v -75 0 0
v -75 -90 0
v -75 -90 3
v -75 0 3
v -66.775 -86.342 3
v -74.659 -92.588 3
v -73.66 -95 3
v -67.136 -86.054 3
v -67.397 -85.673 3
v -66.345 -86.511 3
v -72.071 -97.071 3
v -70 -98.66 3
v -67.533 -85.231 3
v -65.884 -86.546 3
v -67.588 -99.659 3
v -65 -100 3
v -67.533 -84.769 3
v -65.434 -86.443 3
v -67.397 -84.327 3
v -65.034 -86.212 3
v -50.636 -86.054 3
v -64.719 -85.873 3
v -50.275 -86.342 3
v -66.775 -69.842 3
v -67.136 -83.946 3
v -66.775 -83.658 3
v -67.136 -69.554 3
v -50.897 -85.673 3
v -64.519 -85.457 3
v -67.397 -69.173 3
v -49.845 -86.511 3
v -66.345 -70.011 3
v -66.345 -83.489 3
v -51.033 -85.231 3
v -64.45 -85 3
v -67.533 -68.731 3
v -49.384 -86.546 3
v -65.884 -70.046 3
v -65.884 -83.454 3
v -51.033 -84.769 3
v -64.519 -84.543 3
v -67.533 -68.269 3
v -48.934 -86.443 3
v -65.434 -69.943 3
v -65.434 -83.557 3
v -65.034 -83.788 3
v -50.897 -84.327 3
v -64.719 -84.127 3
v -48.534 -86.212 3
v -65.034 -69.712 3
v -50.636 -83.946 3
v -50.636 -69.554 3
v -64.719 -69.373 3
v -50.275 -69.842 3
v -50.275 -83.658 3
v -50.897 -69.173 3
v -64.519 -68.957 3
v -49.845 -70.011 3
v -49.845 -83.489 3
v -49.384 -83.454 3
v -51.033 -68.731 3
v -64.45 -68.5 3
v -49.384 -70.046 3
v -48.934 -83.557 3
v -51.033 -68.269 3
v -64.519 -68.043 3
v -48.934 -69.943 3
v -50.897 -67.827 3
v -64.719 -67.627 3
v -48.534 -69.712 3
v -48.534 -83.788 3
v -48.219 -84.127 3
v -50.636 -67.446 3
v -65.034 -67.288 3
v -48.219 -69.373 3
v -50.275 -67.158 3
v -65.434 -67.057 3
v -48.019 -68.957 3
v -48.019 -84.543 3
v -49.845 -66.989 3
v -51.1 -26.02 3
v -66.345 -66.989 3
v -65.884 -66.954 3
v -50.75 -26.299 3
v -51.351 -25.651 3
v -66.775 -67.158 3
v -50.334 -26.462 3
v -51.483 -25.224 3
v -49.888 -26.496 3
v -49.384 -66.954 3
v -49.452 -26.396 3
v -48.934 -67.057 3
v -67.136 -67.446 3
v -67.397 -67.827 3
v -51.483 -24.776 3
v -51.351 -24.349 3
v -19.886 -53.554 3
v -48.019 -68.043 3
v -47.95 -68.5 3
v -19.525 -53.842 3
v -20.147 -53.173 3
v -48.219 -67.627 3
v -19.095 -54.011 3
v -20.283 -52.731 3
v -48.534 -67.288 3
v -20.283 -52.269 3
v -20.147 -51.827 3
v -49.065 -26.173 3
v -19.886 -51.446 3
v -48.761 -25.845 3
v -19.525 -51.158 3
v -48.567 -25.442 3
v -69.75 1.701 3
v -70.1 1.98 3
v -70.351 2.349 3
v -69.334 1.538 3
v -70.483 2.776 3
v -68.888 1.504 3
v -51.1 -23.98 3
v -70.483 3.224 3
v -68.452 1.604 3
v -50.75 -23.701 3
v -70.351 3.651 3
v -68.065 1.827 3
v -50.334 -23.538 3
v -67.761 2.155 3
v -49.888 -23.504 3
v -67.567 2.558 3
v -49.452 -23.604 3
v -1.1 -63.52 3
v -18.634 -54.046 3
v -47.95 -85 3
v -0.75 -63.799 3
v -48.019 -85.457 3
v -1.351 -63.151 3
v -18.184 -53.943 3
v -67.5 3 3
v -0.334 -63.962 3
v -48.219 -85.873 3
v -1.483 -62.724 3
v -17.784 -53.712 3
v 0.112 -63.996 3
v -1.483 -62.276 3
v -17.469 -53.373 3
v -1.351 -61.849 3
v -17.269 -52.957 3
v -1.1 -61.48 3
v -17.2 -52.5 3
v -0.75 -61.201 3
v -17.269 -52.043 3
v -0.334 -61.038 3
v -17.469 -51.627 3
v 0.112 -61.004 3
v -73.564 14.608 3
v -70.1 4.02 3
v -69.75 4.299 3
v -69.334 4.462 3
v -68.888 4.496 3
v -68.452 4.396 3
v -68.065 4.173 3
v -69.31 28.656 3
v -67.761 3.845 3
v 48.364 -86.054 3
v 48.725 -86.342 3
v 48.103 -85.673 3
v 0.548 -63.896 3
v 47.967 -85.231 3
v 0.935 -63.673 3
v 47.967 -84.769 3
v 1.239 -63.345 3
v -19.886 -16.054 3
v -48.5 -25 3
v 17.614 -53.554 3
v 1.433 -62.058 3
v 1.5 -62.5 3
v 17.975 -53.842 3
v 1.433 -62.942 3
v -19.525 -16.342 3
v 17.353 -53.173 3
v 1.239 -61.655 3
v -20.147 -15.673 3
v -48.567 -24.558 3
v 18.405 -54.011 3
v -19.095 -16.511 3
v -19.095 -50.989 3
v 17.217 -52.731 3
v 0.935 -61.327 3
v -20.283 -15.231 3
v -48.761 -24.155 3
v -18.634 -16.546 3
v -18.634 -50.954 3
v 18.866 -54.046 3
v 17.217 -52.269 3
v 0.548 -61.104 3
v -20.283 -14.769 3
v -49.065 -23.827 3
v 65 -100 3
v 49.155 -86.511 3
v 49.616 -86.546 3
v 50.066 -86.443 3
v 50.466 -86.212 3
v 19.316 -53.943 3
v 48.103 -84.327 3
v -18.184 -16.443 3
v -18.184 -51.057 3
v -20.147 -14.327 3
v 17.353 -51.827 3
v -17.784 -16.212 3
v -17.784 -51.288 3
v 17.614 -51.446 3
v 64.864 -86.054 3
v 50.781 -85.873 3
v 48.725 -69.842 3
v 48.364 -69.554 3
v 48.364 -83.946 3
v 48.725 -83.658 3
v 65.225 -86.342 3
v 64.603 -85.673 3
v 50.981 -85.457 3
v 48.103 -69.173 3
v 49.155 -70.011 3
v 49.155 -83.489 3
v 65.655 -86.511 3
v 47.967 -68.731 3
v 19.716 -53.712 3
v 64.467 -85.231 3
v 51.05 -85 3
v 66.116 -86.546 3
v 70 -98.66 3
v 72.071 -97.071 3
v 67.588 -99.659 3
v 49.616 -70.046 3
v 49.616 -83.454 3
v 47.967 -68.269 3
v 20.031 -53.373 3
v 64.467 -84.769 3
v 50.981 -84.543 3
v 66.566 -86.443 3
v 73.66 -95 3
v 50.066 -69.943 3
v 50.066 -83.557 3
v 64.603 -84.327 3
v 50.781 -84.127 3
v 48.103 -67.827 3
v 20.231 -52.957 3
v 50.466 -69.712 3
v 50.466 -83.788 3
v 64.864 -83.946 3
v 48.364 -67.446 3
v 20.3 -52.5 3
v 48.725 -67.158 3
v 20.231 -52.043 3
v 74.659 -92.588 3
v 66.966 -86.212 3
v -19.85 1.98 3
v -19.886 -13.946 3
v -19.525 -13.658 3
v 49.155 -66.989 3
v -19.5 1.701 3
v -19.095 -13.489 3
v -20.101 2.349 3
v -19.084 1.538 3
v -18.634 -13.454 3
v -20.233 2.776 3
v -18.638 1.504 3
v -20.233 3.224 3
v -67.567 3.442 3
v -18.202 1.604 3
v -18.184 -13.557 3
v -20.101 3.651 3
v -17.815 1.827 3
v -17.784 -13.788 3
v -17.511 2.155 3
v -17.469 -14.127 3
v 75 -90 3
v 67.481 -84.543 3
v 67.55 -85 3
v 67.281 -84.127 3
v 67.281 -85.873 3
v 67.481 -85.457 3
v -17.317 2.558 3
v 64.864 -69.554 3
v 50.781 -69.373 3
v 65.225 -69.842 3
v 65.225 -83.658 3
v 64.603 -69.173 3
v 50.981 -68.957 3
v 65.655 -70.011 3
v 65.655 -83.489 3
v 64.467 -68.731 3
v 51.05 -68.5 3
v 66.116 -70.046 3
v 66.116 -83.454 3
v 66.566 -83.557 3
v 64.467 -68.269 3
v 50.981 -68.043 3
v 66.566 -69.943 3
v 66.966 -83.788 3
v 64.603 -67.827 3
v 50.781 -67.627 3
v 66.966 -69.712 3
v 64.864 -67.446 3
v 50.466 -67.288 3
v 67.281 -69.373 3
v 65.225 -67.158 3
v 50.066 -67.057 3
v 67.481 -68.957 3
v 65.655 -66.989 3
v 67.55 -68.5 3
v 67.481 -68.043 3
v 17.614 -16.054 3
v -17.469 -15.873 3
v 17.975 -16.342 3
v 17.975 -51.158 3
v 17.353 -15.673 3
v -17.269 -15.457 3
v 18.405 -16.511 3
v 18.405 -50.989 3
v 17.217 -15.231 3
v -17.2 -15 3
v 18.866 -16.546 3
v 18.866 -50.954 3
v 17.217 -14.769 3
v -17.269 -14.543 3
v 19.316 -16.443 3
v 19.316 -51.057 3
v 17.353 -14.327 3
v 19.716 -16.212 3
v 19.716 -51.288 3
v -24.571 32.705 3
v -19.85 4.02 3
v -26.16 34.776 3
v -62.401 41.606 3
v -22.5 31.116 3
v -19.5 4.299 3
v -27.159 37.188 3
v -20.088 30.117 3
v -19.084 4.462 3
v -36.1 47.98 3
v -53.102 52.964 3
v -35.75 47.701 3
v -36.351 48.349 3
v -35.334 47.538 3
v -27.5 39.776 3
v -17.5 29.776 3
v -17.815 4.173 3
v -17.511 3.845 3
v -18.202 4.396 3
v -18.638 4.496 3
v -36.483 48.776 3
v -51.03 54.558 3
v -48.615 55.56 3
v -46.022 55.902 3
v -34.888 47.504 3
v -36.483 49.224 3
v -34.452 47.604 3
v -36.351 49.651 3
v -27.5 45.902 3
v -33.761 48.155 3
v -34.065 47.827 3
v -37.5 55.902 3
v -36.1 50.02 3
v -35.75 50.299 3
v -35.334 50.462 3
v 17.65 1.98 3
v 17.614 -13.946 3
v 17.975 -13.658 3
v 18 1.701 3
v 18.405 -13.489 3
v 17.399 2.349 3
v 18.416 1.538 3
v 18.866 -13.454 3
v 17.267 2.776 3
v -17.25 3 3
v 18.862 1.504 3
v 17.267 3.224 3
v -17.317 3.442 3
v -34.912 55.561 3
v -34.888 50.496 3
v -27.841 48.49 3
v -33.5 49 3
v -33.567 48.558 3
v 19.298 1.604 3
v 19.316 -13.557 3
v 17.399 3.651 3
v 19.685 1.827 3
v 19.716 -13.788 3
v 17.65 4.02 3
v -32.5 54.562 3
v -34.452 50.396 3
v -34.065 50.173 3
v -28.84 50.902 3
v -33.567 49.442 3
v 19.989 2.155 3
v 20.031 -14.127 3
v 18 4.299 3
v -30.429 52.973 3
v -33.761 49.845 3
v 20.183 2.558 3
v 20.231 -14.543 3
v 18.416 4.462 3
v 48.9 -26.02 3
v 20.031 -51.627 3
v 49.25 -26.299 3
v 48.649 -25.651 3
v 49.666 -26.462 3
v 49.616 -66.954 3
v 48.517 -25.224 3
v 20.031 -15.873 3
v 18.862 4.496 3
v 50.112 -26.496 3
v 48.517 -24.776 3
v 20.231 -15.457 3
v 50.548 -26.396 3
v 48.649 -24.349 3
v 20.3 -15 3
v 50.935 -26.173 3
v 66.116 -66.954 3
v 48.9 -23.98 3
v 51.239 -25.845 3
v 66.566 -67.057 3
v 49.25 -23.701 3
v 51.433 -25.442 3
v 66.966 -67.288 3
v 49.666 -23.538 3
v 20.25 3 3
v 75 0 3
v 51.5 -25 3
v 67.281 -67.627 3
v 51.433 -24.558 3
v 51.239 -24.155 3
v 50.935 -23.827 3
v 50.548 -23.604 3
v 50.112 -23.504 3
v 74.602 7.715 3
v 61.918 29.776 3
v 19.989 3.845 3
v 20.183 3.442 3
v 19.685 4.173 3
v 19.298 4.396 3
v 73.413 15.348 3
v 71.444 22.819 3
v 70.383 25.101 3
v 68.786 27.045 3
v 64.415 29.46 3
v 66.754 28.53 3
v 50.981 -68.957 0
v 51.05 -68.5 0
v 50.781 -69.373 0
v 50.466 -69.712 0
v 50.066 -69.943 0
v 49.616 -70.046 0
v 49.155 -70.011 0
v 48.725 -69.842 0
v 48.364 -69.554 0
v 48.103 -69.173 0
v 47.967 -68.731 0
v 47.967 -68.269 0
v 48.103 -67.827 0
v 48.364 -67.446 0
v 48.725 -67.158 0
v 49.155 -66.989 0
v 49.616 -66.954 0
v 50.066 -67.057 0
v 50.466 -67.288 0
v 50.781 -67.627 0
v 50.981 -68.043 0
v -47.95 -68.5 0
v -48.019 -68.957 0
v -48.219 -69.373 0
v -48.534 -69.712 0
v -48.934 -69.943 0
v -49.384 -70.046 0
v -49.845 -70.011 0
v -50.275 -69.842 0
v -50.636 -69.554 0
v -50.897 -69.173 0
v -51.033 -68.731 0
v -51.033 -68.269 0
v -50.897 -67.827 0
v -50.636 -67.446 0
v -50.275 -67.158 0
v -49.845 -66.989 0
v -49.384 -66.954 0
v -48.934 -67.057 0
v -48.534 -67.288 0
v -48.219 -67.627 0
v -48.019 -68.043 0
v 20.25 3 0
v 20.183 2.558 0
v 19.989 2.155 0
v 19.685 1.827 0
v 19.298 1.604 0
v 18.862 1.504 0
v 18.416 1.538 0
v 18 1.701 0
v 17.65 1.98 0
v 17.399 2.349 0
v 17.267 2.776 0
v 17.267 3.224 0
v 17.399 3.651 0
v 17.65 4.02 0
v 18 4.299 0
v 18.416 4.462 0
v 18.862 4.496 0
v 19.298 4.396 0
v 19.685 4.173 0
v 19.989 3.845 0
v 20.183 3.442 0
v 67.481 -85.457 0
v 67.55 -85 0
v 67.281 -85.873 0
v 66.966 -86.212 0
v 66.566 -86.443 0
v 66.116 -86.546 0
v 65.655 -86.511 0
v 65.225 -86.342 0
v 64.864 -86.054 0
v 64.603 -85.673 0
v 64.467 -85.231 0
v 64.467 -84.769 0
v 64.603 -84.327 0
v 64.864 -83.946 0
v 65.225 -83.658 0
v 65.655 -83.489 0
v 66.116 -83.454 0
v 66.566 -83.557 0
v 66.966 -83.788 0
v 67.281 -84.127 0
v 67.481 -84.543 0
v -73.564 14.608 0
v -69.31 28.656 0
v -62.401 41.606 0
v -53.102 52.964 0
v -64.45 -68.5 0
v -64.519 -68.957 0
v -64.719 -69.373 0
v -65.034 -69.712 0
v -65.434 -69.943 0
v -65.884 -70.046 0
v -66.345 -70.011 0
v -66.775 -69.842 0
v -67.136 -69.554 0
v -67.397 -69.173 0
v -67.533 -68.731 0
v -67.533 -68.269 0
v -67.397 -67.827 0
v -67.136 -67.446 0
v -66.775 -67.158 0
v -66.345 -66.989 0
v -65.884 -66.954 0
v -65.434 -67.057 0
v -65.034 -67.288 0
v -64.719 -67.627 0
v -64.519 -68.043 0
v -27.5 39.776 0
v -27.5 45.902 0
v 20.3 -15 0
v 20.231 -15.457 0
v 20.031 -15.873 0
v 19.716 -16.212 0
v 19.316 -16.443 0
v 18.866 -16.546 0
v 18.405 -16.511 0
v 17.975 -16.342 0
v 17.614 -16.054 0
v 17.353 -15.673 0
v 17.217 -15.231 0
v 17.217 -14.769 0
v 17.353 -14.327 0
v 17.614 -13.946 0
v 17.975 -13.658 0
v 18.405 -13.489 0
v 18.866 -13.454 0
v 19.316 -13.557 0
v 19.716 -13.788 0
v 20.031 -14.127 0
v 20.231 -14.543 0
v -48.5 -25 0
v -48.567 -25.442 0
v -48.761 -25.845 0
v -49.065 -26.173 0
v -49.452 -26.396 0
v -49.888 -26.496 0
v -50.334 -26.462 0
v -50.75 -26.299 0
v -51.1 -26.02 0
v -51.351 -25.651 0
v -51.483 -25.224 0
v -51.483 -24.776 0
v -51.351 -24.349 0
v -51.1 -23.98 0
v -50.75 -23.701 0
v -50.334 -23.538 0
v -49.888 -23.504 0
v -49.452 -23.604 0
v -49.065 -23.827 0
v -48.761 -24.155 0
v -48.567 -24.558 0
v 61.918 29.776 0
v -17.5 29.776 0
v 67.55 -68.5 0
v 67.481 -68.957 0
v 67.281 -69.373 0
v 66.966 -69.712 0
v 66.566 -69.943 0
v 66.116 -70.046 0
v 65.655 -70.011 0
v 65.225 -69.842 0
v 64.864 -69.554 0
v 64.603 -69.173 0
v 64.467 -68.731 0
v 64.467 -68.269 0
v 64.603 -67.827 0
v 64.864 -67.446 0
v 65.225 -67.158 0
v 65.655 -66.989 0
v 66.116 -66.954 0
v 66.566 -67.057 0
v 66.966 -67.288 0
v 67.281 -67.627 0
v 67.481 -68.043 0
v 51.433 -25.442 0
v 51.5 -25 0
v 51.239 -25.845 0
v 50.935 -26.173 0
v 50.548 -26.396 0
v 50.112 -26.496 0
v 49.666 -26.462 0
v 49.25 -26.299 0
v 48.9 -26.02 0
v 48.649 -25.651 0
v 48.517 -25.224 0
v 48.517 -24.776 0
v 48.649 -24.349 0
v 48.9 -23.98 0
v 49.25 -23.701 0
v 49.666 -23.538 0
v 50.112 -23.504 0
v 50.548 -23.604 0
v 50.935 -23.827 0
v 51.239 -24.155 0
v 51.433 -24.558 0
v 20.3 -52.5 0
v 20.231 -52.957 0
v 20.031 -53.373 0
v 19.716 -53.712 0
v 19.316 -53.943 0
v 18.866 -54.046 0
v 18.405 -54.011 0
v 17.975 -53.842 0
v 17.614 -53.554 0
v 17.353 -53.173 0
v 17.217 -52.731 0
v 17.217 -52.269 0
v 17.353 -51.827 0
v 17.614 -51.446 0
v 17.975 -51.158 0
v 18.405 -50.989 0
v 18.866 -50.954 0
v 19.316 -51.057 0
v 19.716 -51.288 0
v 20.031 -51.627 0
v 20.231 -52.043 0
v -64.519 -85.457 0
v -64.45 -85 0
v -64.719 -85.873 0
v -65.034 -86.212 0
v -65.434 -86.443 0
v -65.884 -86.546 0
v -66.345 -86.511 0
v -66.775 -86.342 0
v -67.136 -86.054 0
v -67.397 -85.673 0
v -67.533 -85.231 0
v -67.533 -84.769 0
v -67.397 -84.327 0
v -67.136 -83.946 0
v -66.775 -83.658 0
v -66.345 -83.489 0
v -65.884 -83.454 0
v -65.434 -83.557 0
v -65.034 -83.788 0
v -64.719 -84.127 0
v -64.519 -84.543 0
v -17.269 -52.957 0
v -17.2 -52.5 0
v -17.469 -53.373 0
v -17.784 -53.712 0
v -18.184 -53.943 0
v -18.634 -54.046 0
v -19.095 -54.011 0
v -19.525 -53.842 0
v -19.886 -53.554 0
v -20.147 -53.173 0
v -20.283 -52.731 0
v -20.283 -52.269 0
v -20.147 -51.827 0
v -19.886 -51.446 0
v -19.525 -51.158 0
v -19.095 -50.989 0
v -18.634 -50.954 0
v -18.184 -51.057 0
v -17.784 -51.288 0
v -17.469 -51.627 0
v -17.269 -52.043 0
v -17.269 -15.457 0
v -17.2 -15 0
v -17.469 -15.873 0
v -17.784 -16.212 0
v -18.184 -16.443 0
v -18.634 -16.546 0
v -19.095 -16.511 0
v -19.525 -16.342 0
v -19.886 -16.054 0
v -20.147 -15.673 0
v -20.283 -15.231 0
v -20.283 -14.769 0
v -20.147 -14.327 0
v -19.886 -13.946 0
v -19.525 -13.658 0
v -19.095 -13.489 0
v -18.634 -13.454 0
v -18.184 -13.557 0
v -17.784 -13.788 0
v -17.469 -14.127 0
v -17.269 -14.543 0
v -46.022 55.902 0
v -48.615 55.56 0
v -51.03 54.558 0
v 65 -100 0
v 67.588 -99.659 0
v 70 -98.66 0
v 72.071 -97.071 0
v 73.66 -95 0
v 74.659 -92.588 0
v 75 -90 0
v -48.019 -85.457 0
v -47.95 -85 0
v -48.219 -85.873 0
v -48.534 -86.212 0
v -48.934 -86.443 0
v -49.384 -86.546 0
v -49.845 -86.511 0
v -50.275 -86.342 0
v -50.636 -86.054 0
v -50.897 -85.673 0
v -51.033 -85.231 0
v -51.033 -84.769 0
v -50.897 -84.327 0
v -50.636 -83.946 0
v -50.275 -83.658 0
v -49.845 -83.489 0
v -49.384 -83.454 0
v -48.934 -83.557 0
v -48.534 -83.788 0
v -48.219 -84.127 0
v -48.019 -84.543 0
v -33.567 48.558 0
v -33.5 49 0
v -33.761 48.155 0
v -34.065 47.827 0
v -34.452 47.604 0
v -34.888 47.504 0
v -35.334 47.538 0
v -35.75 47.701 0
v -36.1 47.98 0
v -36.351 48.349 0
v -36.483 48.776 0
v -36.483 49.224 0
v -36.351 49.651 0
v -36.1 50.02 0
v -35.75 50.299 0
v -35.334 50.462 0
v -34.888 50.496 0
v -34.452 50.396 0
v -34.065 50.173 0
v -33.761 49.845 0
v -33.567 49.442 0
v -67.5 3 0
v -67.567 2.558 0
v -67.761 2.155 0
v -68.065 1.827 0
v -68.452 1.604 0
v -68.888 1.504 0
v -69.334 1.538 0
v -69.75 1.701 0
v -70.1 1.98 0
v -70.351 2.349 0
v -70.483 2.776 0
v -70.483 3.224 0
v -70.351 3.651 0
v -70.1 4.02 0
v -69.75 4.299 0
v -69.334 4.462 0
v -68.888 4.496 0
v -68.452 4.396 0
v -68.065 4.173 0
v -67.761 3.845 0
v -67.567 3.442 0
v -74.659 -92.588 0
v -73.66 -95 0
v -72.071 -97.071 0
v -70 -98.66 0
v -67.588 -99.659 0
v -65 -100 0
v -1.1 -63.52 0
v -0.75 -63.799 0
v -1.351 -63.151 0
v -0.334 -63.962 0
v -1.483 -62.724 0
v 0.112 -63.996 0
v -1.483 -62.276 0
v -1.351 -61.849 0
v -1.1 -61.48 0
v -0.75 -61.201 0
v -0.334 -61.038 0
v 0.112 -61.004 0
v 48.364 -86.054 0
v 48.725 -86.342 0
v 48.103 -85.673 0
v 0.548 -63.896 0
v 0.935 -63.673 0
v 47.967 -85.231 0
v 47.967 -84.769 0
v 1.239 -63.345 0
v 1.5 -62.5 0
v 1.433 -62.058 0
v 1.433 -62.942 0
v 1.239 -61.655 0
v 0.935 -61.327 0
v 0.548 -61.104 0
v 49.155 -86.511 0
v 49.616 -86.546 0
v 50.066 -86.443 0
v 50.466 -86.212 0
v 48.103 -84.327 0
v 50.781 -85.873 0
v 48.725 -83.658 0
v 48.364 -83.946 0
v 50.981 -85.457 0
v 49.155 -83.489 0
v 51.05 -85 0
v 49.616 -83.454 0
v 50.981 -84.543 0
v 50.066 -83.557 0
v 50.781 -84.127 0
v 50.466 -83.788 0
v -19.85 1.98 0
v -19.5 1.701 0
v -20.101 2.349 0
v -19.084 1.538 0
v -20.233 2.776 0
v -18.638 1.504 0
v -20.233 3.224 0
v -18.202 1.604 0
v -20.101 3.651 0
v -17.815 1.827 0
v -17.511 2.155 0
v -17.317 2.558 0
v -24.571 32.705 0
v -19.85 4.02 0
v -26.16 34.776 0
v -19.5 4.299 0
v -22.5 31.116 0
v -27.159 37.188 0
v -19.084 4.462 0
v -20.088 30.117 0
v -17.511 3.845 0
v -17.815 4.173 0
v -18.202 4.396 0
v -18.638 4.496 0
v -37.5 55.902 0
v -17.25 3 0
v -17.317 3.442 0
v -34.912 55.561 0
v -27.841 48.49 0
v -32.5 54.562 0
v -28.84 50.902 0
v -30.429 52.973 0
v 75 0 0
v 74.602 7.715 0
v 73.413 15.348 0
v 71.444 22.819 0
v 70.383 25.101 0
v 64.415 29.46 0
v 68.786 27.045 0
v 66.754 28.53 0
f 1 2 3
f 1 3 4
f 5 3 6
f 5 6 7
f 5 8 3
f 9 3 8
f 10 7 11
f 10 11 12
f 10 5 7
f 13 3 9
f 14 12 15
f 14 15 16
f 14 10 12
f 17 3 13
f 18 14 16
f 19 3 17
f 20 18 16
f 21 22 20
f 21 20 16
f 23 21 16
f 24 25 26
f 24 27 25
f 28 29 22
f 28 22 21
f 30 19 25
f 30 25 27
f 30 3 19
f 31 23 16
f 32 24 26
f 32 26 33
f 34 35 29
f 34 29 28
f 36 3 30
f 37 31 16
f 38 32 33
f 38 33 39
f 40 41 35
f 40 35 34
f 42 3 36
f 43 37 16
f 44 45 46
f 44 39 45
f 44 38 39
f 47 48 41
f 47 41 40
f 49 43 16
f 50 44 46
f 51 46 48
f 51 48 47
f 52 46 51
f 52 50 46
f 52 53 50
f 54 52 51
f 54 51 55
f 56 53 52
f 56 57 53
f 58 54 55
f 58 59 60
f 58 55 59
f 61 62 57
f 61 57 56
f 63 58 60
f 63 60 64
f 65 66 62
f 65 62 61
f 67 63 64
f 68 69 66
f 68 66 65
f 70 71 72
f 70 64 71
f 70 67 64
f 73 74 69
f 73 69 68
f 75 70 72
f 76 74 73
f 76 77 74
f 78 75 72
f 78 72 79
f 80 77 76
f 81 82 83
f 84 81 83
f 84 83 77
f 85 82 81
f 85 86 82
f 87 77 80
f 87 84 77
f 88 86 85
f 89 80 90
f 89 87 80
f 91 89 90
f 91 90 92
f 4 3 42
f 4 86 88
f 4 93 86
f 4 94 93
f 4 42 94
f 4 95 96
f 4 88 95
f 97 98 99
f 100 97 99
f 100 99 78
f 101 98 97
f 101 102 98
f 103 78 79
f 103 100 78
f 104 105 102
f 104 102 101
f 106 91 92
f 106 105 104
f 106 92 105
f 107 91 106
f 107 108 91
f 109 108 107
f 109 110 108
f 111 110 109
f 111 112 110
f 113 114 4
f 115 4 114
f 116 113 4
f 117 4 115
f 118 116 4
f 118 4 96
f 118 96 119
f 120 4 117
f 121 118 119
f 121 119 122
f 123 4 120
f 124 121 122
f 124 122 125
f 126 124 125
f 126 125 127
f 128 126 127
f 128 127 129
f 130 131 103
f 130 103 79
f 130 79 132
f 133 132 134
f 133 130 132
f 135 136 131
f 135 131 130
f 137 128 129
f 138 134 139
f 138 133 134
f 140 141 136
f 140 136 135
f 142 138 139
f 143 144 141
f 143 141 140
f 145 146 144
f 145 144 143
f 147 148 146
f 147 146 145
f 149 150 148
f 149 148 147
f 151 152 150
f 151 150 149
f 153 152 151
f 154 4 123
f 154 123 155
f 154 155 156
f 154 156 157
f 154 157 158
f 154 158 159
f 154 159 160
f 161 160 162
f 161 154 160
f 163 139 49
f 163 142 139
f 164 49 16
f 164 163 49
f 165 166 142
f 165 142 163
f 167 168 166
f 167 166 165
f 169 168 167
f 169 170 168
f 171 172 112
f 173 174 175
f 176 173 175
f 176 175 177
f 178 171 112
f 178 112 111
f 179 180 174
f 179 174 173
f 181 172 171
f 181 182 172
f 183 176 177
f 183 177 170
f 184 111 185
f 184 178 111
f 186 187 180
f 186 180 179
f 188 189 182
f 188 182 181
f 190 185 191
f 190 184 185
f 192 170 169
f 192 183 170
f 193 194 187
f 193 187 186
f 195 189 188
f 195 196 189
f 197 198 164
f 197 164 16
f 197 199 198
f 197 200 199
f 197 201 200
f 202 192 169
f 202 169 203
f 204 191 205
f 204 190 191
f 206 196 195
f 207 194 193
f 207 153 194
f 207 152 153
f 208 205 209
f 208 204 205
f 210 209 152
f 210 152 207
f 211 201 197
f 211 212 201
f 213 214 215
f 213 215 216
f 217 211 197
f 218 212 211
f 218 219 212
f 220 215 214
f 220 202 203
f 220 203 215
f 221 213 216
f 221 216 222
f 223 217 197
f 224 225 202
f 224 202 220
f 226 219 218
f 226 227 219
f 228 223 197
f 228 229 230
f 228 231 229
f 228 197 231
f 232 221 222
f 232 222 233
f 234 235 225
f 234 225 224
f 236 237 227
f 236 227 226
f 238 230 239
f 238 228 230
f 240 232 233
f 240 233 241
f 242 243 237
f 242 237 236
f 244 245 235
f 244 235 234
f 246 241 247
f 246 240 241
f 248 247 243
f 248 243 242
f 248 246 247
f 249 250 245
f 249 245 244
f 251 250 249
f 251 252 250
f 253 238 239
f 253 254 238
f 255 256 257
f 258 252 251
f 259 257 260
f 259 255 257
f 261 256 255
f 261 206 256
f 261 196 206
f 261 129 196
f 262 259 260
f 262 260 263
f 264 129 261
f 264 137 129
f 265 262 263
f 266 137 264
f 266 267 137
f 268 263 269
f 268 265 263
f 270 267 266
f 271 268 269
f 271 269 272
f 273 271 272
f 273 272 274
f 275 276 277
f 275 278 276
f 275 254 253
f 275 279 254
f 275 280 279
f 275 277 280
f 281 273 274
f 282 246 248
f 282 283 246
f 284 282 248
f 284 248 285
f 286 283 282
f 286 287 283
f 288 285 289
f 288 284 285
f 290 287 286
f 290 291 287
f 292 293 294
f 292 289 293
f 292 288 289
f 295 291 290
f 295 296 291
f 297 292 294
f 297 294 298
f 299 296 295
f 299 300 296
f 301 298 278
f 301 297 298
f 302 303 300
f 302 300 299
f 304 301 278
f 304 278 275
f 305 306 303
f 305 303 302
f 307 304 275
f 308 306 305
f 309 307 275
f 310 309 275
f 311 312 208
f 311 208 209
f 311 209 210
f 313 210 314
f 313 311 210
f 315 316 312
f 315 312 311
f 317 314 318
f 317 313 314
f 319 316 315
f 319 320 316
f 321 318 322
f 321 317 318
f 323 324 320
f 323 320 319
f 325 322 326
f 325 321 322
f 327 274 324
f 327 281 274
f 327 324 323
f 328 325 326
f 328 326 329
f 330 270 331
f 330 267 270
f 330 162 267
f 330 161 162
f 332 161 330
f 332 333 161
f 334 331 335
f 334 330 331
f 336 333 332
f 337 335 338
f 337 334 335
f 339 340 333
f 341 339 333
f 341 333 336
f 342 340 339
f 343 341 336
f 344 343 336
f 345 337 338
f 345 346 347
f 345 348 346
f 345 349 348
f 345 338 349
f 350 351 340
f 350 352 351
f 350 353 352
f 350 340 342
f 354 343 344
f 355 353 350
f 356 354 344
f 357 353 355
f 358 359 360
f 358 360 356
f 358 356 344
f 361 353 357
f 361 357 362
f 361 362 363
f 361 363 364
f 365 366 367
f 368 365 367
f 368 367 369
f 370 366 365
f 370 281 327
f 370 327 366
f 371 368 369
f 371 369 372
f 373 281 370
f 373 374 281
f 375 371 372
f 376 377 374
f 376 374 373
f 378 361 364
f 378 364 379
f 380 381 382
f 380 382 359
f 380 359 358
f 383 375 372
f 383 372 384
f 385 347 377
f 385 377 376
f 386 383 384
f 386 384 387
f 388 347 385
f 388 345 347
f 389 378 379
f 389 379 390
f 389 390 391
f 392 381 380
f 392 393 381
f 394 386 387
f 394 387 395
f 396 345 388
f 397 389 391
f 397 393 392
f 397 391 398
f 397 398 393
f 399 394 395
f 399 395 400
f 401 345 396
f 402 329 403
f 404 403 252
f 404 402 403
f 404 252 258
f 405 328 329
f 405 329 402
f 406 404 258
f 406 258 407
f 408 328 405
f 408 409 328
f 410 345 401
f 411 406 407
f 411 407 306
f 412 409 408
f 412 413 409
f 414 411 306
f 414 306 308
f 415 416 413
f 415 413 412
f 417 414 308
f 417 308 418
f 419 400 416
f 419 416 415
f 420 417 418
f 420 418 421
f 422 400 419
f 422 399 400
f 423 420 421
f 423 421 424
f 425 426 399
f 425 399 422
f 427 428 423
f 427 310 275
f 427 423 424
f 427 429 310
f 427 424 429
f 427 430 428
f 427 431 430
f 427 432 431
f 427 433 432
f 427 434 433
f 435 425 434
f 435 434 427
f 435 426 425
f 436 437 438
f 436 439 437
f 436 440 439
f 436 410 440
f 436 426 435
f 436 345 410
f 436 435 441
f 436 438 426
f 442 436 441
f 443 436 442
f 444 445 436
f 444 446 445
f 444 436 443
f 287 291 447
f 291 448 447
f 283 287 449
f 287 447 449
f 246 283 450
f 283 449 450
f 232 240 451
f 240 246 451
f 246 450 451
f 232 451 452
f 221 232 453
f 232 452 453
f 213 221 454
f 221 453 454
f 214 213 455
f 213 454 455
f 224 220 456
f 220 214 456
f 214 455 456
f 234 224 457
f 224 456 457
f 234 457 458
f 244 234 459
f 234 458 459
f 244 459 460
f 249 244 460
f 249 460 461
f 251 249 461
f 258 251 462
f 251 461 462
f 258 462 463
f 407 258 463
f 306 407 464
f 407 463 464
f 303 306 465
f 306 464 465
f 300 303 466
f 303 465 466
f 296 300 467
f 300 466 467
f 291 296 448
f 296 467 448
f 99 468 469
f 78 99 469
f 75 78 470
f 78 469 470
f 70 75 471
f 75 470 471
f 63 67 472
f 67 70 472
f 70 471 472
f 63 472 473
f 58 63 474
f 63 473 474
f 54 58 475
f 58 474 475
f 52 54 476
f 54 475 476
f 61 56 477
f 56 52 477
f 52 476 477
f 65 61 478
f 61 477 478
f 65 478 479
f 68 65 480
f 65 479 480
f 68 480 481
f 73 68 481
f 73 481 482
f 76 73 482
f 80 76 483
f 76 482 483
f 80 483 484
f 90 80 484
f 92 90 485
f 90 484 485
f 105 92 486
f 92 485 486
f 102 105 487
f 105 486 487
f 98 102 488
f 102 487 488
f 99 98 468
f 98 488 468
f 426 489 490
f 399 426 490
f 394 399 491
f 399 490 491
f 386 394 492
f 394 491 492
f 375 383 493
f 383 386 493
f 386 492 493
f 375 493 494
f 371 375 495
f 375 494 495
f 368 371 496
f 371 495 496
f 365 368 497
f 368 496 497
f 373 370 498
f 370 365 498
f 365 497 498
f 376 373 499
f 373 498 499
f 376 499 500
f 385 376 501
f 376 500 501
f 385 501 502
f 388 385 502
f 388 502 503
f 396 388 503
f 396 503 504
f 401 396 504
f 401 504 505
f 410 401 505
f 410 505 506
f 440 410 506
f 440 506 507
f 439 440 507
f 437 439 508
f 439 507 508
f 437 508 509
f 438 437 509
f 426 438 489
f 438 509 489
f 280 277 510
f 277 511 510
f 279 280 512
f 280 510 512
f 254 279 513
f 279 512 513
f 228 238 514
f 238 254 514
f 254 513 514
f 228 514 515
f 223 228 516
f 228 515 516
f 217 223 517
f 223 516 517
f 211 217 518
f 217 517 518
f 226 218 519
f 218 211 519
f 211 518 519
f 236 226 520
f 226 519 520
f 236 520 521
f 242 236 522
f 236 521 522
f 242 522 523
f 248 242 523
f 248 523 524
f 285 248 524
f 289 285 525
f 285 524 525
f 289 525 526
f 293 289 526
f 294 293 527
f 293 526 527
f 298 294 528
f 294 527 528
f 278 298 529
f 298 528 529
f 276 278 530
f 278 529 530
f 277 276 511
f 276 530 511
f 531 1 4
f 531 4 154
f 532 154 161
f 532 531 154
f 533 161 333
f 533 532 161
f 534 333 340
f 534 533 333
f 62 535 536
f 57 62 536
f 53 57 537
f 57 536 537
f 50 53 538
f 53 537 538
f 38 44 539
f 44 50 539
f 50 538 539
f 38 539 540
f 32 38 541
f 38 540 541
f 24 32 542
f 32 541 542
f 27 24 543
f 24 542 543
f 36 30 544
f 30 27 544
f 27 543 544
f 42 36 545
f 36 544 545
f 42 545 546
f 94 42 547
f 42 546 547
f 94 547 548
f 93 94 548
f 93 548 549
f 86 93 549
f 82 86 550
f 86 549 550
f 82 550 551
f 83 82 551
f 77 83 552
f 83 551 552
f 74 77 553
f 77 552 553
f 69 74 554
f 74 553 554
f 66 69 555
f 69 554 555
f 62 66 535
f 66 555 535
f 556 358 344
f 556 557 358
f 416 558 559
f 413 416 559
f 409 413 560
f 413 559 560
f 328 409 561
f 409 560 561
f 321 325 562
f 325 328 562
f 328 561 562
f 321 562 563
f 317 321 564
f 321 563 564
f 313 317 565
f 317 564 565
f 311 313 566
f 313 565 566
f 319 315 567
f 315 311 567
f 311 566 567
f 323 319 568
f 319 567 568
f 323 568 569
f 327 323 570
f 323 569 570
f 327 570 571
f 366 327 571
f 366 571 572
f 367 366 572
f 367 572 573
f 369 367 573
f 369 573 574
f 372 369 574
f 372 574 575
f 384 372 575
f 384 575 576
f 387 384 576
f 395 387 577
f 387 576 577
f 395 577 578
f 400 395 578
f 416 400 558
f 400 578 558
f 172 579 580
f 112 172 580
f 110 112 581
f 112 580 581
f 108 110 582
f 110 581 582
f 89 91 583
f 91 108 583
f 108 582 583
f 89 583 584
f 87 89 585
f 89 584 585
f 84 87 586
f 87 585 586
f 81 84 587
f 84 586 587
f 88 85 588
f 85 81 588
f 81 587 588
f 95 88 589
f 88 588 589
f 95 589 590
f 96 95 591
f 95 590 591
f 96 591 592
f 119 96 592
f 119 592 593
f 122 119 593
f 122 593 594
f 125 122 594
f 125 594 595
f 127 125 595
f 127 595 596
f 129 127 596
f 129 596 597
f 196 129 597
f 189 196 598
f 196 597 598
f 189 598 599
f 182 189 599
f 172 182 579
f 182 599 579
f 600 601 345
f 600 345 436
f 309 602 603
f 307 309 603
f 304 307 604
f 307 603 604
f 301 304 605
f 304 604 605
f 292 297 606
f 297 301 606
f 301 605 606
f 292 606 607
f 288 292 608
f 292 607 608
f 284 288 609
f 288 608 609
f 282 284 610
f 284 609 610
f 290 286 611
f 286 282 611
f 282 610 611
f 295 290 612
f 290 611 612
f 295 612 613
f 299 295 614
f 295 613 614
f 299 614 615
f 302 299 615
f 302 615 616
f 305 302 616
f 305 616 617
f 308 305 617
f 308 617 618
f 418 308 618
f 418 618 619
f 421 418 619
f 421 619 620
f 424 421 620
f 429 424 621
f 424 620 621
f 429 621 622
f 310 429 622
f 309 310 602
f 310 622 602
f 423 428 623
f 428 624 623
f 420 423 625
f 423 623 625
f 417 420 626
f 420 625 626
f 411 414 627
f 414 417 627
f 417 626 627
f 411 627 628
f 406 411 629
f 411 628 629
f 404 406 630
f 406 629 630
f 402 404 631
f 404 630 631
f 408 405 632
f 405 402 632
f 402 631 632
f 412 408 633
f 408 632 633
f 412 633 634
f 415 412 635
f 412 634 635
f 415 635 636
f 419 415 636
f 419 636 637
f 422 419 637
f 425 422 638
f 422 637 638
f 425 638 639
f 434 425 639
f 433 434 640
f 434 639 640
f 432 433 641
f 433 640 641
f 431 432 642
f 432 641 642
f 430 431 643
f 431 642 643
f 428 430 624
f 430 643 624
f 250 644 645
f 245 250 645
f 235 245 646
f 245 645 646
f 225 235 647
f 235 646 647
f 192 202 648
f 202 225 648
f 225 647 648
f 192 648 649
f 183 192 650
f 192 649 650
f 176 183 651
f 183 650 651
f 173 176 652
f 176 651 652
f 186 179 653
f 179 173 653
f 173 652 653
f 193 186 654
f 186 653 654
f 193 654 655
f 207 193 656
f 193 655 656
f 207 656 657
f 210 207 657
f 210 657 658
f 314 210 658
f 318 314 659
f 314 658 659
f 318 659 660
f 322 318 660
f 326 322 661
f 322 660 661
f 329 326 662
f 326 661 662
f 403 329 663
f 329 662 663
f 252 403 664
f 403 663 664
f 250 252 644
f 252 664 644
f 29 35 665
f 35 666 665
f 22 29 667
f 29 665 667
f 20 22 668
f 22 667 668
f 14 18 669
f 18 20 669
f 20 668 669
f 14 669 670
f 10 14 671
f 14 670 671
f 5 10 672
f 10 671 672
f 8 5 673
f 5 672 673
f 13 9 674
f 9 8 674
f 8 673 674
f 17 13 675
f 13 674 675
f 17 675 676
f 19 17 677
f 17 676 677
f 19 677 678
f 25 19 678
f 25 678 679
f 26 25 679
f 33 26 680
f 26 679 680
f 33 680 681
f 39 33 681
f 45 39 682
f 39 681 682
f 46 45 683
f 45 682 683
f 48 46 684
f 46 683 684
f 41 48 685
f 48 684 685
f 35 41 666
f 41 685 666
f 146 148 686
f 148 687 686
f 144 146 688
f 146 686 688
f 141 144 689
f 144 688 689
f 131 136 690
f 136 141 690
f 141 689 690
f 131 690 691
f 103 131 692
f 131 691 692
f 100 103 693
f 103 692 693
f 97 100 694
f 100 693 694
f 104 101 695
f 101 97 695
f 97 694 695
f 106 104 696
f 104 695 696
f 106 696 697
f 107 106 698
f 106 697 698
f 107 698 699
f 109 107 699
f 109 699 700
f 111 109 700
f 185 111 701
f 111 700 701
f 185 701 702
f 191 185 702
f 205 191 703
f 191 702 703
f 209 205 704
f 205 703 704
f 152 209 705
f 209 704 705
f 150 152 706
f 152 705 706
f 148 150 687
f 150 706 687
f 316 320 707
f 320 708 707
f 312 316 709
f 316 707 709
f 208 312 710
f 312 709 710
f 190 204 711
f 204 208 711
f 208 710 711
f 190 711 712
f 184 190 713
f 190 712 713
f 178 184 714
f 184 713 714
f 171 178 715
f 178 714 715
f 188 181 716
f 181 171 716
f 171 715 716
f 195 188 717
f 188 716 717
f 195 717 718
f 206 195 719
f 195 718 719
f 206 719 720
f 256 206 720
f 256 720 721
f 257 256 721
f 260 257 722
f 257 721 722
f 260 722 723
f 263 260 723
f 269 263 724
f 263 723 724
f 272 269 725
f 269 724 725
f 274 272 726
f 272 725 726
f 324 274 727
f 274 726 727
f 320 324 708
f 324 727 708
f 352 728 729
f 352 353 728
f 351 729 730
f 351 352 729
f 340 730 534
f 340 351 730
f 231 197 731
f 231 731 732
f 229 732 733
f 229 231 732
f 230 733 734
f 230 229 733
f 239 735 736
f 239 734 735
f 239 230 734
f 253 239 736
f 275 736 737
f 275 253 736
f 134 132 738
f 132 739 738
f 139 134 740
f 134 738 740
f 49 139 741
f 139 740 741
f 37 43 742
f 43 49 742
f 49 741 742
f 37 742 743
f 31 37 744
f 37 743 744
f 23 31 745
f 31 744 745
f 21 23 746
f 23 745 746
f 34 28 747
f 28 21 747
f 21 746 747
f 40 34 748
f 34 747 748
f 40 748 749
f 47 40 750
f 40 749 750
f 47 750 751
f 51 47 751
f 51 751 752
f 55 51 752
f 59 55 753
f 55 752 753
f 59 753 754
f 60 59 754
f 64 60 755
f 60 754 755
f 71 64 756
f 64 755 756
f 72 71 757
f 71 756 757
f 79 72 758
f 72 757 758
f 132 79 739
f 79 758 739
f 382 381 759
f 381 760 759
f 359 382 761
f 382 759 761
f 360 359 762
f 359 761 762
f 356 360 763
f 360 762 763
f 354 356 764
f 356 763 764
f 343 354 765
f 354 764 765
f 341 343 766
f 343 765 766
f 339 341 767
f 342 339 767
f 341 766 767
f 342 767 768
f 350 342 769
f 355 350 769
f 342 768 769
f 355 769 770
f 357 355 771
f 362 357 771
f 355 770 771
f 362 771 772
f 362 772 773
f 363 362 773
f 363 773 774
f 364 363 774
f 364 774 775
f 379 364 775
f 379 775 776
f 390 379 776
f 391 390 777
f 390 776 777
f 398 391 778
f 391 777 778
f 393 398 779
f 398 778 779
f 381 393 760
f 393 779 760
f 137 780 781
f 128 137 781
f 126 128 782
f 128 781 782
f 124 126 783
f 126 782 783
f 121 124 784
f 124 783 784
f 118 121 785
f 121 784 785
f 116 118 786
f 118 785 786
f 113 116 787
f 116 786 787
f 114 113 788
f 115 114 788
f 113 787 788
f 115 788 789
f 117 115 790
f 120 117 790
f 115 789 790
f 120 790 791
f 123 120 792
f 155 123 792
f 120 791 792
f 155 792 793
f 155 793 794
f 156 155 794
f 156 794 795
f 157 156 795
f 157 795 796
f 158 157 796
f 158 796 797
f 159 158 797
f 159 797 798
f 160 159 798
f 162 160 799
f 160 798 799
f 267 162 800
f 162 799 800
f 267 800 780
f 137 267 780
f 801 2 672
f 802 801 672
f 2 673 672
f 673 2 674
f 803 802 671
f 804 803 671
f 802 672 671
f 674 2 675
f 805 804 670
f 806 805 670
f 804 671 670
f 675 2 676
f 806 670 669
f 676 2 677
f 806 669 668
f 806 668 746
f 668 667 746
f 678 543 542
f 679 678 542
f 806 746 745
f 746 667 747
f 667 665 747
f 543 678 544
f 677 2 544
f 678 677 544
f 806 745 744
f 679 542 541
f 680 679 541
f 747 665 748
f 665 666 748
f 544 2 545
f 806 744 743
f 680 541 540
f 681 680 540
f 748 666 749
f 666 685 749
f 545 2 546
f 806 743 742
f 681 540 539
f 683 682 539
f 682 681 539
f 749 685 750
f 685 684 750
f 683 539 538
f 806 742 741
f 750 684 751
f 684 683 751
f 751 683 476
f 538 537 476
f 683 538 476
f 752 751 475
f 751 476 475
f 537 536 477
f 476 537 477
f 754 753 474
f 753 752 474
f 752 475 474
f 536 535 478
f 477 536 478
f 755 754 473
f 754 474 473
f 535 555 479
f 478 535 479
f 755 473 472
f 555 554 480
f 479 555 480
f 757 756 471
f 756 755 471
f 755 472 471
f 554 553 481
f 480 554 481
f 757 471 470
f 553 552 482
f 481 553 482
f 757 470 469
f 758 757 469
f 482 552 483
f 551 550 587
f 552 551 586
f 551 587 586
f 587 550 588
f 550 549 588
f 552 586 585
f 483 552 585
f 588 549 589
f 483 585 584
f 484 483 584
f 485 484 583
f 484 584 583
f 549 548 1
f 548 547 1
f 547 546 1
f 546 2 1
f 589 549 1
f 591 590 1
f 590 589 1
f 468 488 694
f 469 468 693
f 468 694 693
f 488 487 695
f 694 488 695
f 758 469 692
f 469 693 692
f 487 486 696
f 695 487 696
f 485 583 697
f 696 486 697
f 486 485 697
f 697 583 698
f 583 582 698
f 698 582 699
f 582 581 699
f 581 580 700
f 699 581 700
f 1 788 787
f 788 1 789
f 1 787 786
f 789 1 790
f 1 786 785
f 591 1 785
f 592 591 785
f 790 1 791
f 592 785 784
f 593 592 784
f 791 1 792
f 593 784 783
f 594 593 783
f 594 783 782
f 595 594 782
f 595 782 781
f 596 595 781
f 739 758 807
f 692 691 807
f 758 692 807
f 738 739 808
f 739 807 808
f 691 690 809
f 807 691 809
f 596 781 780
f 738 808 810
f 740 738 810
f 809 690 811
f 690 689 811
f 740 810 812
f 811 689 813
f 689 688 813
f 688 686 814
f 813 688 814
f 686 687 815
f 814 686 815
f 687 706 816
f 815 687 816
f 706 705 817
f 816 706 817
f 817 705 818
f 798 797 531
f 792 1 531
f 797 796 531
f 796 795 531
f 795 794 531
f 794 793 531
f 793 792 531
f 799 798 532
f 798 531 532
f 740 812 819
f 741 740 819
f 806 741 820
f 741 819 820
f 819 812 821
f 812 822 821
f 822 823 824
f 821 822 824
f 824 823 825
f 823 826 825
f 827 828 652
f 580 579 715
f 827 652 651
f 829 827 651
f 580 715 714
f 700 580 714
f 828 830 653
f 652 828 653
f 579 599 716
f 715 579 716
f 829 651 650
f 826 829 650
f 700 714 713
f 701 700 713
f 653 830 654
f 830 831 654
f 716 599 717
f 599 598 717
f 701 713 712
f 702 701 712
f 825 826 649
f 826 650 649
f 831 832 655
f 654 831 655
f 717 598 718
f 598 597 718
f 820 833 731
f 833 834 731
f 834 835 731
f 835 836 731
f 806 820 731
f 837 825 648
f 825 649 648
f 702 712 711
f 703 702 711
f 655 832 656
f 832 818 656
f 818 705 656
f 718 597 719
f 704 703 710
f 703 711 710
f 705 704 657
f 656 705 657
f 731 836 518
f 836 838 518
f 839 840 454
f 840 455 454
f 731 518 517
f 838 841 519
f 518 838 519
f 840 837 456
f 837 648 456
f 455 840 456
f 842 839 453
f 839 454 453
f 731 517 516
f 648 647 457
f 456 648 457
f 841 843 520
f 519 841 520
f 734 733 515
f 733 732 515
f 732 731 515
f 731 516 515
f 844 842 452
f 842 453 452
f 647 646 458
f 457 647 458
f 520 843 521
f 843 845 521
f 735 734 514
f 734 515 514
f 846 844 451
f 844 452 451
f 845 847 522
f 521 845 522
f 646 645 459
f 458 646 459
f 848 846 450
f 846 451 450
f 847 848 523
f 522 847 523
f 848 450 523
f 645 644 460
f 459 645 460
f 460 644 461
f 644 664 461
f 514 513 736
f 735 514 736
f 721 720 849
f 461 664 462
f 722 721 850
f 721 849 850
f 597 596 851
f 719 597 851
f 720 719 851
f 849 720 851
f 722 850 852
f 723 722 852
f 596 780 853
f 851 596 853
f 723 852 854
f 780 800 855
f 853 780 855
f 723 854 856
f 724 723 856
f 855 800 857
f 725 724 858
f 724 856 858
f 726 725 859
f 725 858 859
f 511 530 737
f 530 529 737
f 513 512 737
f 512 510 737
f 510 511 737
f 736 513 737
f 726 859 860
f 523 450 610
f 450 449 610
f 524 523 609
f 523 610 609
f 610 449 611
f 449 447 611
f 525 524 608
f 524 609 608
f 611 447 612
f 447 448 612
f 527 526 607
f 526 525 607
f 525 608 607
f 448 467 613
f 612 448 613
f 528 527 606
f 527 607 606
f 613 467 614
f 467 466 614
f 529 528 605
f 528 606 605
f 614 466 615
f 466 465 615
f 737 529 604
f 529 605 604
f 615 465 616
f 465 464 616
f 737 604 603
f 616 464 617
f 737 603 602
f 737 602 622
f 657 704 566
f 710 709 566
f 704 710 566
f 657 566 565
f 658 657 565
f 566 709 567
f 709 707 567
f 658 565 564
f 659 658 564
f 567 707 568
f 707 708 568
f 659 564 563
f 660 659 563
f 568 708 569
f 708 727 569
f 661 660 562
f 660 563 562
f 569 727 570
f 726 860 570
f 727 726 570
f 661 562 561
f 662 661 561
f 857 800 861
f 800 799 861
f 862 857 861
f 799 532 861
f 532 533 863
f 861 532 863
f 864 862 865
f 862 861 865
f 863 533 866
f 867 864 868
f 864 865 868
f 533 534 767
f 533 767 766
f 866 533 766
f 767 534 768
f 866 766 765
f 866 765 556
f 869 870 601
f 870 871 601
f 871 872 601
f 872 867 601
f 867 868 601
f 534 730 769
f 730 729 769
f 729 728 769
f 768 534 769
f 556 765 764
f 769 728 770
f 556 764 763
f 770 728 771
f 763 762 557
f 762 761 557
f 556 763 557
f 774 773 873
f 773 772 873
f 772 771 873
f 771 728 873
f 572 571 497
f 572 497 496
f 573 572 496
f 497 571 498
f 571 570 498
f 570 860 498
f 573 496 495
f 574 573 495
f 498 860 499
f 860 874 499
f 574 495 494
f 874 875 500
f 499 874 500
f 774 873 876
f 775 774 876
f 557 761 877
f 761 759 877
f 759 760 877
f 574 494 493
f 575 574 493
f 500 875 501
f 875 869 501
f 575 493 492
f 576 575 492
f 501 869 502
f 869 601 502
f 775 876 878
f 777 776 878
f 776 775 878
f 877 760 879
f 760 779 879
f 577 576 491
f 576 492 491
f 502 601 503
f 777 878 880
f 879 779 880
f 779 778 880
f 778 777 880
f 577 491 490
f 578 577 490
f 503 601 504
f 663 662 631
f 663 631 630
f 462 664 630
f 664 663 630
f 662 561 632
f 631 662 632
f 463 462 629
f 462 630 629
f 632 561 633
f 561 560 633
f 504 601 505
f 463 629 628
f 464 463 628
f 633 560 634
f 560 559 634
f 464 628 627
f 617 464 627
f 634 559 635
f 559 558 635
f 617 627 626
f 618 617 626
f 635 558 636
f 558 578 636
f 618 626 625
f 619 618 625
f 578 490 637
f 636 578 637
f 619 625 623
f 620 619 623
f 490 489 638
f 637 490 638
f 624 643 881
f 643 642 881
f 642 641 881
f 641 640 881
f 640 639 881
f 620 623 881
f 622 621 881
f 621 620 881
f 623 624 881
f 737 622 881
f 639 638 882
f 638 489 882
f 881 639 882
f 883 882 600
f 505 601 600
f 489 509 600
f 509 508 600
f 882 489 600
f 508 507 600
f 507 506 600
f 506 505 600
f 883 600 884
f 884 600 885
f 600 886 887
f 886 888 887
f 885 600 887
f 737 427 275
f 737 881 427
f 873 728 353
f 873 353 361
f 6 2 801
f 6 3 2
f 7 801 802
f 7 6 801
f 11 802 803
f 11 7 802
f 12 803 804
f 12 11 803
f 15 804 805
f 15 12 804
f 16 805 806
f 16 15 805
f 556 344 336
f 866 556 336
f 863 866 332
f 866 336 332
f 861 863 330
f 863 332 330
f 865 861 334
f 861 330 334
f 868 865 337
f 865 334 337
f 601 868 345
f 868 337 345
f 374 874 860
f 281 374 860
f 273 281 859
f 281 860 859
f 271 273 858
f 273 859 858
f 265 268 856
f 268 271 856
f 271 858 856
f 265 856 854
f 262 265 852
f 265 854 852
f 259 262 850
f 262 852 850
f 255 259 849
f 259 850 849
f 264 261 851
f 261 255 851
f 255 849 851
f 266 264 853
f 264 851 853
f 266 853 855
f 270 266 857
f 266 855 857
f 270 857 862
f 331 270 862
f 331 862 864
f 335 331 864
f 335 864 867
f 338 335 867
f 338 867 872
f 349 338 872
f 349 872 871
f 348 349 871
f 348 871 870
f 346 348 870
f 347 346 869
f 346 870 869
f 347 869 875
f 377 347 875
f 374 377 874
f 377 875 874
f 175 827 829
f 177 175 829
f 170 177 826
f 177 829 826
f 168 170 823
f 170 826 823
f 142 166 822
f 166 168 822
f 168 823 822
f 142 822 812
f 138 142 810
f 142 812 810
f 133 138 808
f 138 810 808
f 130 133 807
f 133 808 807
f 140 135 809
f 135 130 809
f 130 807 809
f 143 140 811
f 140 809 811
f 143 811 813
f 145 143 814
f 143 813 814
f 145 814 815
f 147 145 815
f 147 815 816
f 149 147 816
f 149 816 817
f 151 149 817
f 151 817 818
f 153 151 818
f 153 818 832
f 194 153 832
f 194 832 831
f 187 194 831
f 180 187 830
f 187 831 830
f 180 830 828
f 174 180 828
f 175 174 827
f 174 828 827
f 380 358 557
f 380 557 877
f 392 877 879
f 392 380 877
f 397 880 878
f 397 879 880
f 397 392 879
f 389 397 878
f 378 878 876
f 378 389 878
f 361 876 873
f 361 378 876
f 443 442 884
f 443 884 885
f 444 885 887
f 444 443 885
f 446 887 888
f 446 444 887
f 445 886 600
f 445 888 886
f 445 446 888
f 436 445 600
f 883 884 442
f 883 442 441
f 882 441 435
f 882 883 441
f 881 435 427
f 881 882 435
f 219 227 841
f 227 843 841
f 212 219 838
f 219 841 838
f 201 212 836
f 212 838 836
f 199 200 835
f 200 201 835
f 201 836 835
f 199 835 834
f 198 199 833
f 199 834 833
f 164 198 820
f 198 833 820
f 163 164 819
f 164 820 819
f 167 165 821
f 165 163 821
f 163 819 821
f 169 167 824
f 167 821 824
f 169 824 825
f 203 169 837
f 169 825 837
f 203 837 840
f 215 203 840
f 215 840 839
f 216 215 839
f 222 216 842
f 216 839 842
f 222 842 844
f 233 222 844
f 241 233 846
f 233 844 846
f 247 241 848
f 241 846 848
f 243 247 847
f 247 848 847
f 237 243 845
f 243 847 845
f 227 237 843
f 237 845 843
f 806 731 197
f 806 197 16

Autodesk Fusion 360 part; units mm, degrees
sketch "Sketch1" plane through (0, 0, 0) normal (0, 0, 1) x (1, 0, 0)
  circle A0 centre (0, 0) radius 75
  line L0 (-75, 0) -> (75, 0)
  line L1 (75, 0) -> (75, -100)
  line L2 (75, -100) -> (-75, -100)
  line L3 (-75, -100) -> (-75, 0)
  circle A1 centre (49.5, -68.5) radius 1.55
  circle A2 centre (66, -85) radius 1.55
  circle A3 centre (66, -68.5) radius 1.55
  circle A4 centre (49.5, -85) radius 1.55
  circle A5 centre (-66, -68.5) radius 1.55
  circle A6 centre (-66, -85) radius 1.55
  circle A7 centre (-49.5, -68.5) radius 1.55
  circle A8 centre (-49.5, -85) radius 1.55
  line L4 (-50, 55.9017) -> (50, 55.9017)
  circle A9 centre (-18.75, -52.5) radius 1.55
  circle A10 centre (18.75, -52.5) radius 1.55
  circle A11 centre (18.75, -15) radius 1.55
  circle A12 centre (-18.75, -15) radius 1.55
  line L5 (-69, 49) -> (-35, 49)
  line L6 (-35, 49) -> (-35, 3)
  line L7 (-35, 3) -> (-69, 3)
  line L8 (-69, 3) -> (-69, 49)
  circle A13 centre (-69, 3) radius 1.5
  circle A14 centre (-35, 49) radius 1.5
  circle A15 centre (-35, 49) radius 3
  circle A16 centre (-69, 3) radius 3
  line L9 (-27.5, 69.7764) -> (-27.5, 29.7764)
  line L10 (-27.5, 29.7764) -> (68.8358, 29.7764)
  circle A17 centre (-18.75, 3) radius 1.5
  circle A18 centre (18.75, 3) radius 1.5
  circle A19 centre (-50, -25) radius 1.5
  circle A20 centre (50, -25) radius 1.5
  circle A21 centre (0, -62.5) radius 1.5
  dimension "d1" = 150
  dimension "d2" = 150
  dimension "d3" = 100
  dimension "d4" = 3.1
  dimension "d5" = 3.1
  dimension "d6" = 3.1
  dimension "d7" = 3.1
  dimension "d8" = 3.1
  dimension "d9" = 3.1
  dimension "d10" = 3.1
  dimension "d11" = 3.1
  dimension "d12" = 16.5
  dimension "d14" = 16.5
  dimension "d15" = 16.5
  dimension "d16" = 16.5
  dimension "d17" = 16.5
  dimension "d18" = 16.5
  dimension "d20" = 16.5
  dimension "d21" = 16.5
  dimension "d22" = 9
  dimension "d23" = 9
  dimension "d24" = 15
  dimension "d25" = 15
  dimension "d26" = 100
  dimension "d27" = 3.1
  dimension "d28" = 3.1
  dimension "d29" = 3.1
  dimension "d30" = 3.1
  dimension "d36" = 37.5
  dimension "d37" = 37.5
  dimension "d38" = 37.5
  dimension "d39" = 37.5
  dimension "d46" = 15
  dimension "d47" = 18.75
  dimension "d55" = 34
  dimension "d56" = 46
  dimension "d57" = 3
  dimension "d58" = 40
  dimension "d59" = 3
  dimension "d60" = 3
  dimension "d73" = 6
  dimension "d74" = 6
  dimension "d86" = 40
  dimension "d87" = 7.5
  dimension "d88" = 3
  dimension "d89" = 3
  dimension "d90" = 37.5
  dimension "d91" = 18.75
  dimension "d92" = 3
  dimension "d95" = 3
  dimension "d96" = 3
  dimension "d97" = 100
  dimension "d98" = 50
  dimension "d99" = 25
  dimension "d100" = 3
  dimension "d101" = 18.75
  dimension "d102" = 10
extrude "Extrude7" add sketch "Sketch1" along normal blind 3 contours A0 L0 L4 L5 L6 L7 A15 A16 L9 L10 | A0 L1 L2 L3 | A0 L0 | A0 L0 L8 A16 | L7 L8 A13 A16 | A0 L5 L6 L7 L8 A15 A16 | L7 L8 A13 A16 | L5 L6 A14 A15 | L5 L6 A14 A15
fillet "Fillet6" radius 10 6 edges at (-27.5, 55.9017, 1.5) (75, -100, 1.5) (-75, -100, 1.5) (-50, 55.9017, 1.5) (68.8358, 29.7764, 1.5) (-27.5, 29.7764, 1.5)
